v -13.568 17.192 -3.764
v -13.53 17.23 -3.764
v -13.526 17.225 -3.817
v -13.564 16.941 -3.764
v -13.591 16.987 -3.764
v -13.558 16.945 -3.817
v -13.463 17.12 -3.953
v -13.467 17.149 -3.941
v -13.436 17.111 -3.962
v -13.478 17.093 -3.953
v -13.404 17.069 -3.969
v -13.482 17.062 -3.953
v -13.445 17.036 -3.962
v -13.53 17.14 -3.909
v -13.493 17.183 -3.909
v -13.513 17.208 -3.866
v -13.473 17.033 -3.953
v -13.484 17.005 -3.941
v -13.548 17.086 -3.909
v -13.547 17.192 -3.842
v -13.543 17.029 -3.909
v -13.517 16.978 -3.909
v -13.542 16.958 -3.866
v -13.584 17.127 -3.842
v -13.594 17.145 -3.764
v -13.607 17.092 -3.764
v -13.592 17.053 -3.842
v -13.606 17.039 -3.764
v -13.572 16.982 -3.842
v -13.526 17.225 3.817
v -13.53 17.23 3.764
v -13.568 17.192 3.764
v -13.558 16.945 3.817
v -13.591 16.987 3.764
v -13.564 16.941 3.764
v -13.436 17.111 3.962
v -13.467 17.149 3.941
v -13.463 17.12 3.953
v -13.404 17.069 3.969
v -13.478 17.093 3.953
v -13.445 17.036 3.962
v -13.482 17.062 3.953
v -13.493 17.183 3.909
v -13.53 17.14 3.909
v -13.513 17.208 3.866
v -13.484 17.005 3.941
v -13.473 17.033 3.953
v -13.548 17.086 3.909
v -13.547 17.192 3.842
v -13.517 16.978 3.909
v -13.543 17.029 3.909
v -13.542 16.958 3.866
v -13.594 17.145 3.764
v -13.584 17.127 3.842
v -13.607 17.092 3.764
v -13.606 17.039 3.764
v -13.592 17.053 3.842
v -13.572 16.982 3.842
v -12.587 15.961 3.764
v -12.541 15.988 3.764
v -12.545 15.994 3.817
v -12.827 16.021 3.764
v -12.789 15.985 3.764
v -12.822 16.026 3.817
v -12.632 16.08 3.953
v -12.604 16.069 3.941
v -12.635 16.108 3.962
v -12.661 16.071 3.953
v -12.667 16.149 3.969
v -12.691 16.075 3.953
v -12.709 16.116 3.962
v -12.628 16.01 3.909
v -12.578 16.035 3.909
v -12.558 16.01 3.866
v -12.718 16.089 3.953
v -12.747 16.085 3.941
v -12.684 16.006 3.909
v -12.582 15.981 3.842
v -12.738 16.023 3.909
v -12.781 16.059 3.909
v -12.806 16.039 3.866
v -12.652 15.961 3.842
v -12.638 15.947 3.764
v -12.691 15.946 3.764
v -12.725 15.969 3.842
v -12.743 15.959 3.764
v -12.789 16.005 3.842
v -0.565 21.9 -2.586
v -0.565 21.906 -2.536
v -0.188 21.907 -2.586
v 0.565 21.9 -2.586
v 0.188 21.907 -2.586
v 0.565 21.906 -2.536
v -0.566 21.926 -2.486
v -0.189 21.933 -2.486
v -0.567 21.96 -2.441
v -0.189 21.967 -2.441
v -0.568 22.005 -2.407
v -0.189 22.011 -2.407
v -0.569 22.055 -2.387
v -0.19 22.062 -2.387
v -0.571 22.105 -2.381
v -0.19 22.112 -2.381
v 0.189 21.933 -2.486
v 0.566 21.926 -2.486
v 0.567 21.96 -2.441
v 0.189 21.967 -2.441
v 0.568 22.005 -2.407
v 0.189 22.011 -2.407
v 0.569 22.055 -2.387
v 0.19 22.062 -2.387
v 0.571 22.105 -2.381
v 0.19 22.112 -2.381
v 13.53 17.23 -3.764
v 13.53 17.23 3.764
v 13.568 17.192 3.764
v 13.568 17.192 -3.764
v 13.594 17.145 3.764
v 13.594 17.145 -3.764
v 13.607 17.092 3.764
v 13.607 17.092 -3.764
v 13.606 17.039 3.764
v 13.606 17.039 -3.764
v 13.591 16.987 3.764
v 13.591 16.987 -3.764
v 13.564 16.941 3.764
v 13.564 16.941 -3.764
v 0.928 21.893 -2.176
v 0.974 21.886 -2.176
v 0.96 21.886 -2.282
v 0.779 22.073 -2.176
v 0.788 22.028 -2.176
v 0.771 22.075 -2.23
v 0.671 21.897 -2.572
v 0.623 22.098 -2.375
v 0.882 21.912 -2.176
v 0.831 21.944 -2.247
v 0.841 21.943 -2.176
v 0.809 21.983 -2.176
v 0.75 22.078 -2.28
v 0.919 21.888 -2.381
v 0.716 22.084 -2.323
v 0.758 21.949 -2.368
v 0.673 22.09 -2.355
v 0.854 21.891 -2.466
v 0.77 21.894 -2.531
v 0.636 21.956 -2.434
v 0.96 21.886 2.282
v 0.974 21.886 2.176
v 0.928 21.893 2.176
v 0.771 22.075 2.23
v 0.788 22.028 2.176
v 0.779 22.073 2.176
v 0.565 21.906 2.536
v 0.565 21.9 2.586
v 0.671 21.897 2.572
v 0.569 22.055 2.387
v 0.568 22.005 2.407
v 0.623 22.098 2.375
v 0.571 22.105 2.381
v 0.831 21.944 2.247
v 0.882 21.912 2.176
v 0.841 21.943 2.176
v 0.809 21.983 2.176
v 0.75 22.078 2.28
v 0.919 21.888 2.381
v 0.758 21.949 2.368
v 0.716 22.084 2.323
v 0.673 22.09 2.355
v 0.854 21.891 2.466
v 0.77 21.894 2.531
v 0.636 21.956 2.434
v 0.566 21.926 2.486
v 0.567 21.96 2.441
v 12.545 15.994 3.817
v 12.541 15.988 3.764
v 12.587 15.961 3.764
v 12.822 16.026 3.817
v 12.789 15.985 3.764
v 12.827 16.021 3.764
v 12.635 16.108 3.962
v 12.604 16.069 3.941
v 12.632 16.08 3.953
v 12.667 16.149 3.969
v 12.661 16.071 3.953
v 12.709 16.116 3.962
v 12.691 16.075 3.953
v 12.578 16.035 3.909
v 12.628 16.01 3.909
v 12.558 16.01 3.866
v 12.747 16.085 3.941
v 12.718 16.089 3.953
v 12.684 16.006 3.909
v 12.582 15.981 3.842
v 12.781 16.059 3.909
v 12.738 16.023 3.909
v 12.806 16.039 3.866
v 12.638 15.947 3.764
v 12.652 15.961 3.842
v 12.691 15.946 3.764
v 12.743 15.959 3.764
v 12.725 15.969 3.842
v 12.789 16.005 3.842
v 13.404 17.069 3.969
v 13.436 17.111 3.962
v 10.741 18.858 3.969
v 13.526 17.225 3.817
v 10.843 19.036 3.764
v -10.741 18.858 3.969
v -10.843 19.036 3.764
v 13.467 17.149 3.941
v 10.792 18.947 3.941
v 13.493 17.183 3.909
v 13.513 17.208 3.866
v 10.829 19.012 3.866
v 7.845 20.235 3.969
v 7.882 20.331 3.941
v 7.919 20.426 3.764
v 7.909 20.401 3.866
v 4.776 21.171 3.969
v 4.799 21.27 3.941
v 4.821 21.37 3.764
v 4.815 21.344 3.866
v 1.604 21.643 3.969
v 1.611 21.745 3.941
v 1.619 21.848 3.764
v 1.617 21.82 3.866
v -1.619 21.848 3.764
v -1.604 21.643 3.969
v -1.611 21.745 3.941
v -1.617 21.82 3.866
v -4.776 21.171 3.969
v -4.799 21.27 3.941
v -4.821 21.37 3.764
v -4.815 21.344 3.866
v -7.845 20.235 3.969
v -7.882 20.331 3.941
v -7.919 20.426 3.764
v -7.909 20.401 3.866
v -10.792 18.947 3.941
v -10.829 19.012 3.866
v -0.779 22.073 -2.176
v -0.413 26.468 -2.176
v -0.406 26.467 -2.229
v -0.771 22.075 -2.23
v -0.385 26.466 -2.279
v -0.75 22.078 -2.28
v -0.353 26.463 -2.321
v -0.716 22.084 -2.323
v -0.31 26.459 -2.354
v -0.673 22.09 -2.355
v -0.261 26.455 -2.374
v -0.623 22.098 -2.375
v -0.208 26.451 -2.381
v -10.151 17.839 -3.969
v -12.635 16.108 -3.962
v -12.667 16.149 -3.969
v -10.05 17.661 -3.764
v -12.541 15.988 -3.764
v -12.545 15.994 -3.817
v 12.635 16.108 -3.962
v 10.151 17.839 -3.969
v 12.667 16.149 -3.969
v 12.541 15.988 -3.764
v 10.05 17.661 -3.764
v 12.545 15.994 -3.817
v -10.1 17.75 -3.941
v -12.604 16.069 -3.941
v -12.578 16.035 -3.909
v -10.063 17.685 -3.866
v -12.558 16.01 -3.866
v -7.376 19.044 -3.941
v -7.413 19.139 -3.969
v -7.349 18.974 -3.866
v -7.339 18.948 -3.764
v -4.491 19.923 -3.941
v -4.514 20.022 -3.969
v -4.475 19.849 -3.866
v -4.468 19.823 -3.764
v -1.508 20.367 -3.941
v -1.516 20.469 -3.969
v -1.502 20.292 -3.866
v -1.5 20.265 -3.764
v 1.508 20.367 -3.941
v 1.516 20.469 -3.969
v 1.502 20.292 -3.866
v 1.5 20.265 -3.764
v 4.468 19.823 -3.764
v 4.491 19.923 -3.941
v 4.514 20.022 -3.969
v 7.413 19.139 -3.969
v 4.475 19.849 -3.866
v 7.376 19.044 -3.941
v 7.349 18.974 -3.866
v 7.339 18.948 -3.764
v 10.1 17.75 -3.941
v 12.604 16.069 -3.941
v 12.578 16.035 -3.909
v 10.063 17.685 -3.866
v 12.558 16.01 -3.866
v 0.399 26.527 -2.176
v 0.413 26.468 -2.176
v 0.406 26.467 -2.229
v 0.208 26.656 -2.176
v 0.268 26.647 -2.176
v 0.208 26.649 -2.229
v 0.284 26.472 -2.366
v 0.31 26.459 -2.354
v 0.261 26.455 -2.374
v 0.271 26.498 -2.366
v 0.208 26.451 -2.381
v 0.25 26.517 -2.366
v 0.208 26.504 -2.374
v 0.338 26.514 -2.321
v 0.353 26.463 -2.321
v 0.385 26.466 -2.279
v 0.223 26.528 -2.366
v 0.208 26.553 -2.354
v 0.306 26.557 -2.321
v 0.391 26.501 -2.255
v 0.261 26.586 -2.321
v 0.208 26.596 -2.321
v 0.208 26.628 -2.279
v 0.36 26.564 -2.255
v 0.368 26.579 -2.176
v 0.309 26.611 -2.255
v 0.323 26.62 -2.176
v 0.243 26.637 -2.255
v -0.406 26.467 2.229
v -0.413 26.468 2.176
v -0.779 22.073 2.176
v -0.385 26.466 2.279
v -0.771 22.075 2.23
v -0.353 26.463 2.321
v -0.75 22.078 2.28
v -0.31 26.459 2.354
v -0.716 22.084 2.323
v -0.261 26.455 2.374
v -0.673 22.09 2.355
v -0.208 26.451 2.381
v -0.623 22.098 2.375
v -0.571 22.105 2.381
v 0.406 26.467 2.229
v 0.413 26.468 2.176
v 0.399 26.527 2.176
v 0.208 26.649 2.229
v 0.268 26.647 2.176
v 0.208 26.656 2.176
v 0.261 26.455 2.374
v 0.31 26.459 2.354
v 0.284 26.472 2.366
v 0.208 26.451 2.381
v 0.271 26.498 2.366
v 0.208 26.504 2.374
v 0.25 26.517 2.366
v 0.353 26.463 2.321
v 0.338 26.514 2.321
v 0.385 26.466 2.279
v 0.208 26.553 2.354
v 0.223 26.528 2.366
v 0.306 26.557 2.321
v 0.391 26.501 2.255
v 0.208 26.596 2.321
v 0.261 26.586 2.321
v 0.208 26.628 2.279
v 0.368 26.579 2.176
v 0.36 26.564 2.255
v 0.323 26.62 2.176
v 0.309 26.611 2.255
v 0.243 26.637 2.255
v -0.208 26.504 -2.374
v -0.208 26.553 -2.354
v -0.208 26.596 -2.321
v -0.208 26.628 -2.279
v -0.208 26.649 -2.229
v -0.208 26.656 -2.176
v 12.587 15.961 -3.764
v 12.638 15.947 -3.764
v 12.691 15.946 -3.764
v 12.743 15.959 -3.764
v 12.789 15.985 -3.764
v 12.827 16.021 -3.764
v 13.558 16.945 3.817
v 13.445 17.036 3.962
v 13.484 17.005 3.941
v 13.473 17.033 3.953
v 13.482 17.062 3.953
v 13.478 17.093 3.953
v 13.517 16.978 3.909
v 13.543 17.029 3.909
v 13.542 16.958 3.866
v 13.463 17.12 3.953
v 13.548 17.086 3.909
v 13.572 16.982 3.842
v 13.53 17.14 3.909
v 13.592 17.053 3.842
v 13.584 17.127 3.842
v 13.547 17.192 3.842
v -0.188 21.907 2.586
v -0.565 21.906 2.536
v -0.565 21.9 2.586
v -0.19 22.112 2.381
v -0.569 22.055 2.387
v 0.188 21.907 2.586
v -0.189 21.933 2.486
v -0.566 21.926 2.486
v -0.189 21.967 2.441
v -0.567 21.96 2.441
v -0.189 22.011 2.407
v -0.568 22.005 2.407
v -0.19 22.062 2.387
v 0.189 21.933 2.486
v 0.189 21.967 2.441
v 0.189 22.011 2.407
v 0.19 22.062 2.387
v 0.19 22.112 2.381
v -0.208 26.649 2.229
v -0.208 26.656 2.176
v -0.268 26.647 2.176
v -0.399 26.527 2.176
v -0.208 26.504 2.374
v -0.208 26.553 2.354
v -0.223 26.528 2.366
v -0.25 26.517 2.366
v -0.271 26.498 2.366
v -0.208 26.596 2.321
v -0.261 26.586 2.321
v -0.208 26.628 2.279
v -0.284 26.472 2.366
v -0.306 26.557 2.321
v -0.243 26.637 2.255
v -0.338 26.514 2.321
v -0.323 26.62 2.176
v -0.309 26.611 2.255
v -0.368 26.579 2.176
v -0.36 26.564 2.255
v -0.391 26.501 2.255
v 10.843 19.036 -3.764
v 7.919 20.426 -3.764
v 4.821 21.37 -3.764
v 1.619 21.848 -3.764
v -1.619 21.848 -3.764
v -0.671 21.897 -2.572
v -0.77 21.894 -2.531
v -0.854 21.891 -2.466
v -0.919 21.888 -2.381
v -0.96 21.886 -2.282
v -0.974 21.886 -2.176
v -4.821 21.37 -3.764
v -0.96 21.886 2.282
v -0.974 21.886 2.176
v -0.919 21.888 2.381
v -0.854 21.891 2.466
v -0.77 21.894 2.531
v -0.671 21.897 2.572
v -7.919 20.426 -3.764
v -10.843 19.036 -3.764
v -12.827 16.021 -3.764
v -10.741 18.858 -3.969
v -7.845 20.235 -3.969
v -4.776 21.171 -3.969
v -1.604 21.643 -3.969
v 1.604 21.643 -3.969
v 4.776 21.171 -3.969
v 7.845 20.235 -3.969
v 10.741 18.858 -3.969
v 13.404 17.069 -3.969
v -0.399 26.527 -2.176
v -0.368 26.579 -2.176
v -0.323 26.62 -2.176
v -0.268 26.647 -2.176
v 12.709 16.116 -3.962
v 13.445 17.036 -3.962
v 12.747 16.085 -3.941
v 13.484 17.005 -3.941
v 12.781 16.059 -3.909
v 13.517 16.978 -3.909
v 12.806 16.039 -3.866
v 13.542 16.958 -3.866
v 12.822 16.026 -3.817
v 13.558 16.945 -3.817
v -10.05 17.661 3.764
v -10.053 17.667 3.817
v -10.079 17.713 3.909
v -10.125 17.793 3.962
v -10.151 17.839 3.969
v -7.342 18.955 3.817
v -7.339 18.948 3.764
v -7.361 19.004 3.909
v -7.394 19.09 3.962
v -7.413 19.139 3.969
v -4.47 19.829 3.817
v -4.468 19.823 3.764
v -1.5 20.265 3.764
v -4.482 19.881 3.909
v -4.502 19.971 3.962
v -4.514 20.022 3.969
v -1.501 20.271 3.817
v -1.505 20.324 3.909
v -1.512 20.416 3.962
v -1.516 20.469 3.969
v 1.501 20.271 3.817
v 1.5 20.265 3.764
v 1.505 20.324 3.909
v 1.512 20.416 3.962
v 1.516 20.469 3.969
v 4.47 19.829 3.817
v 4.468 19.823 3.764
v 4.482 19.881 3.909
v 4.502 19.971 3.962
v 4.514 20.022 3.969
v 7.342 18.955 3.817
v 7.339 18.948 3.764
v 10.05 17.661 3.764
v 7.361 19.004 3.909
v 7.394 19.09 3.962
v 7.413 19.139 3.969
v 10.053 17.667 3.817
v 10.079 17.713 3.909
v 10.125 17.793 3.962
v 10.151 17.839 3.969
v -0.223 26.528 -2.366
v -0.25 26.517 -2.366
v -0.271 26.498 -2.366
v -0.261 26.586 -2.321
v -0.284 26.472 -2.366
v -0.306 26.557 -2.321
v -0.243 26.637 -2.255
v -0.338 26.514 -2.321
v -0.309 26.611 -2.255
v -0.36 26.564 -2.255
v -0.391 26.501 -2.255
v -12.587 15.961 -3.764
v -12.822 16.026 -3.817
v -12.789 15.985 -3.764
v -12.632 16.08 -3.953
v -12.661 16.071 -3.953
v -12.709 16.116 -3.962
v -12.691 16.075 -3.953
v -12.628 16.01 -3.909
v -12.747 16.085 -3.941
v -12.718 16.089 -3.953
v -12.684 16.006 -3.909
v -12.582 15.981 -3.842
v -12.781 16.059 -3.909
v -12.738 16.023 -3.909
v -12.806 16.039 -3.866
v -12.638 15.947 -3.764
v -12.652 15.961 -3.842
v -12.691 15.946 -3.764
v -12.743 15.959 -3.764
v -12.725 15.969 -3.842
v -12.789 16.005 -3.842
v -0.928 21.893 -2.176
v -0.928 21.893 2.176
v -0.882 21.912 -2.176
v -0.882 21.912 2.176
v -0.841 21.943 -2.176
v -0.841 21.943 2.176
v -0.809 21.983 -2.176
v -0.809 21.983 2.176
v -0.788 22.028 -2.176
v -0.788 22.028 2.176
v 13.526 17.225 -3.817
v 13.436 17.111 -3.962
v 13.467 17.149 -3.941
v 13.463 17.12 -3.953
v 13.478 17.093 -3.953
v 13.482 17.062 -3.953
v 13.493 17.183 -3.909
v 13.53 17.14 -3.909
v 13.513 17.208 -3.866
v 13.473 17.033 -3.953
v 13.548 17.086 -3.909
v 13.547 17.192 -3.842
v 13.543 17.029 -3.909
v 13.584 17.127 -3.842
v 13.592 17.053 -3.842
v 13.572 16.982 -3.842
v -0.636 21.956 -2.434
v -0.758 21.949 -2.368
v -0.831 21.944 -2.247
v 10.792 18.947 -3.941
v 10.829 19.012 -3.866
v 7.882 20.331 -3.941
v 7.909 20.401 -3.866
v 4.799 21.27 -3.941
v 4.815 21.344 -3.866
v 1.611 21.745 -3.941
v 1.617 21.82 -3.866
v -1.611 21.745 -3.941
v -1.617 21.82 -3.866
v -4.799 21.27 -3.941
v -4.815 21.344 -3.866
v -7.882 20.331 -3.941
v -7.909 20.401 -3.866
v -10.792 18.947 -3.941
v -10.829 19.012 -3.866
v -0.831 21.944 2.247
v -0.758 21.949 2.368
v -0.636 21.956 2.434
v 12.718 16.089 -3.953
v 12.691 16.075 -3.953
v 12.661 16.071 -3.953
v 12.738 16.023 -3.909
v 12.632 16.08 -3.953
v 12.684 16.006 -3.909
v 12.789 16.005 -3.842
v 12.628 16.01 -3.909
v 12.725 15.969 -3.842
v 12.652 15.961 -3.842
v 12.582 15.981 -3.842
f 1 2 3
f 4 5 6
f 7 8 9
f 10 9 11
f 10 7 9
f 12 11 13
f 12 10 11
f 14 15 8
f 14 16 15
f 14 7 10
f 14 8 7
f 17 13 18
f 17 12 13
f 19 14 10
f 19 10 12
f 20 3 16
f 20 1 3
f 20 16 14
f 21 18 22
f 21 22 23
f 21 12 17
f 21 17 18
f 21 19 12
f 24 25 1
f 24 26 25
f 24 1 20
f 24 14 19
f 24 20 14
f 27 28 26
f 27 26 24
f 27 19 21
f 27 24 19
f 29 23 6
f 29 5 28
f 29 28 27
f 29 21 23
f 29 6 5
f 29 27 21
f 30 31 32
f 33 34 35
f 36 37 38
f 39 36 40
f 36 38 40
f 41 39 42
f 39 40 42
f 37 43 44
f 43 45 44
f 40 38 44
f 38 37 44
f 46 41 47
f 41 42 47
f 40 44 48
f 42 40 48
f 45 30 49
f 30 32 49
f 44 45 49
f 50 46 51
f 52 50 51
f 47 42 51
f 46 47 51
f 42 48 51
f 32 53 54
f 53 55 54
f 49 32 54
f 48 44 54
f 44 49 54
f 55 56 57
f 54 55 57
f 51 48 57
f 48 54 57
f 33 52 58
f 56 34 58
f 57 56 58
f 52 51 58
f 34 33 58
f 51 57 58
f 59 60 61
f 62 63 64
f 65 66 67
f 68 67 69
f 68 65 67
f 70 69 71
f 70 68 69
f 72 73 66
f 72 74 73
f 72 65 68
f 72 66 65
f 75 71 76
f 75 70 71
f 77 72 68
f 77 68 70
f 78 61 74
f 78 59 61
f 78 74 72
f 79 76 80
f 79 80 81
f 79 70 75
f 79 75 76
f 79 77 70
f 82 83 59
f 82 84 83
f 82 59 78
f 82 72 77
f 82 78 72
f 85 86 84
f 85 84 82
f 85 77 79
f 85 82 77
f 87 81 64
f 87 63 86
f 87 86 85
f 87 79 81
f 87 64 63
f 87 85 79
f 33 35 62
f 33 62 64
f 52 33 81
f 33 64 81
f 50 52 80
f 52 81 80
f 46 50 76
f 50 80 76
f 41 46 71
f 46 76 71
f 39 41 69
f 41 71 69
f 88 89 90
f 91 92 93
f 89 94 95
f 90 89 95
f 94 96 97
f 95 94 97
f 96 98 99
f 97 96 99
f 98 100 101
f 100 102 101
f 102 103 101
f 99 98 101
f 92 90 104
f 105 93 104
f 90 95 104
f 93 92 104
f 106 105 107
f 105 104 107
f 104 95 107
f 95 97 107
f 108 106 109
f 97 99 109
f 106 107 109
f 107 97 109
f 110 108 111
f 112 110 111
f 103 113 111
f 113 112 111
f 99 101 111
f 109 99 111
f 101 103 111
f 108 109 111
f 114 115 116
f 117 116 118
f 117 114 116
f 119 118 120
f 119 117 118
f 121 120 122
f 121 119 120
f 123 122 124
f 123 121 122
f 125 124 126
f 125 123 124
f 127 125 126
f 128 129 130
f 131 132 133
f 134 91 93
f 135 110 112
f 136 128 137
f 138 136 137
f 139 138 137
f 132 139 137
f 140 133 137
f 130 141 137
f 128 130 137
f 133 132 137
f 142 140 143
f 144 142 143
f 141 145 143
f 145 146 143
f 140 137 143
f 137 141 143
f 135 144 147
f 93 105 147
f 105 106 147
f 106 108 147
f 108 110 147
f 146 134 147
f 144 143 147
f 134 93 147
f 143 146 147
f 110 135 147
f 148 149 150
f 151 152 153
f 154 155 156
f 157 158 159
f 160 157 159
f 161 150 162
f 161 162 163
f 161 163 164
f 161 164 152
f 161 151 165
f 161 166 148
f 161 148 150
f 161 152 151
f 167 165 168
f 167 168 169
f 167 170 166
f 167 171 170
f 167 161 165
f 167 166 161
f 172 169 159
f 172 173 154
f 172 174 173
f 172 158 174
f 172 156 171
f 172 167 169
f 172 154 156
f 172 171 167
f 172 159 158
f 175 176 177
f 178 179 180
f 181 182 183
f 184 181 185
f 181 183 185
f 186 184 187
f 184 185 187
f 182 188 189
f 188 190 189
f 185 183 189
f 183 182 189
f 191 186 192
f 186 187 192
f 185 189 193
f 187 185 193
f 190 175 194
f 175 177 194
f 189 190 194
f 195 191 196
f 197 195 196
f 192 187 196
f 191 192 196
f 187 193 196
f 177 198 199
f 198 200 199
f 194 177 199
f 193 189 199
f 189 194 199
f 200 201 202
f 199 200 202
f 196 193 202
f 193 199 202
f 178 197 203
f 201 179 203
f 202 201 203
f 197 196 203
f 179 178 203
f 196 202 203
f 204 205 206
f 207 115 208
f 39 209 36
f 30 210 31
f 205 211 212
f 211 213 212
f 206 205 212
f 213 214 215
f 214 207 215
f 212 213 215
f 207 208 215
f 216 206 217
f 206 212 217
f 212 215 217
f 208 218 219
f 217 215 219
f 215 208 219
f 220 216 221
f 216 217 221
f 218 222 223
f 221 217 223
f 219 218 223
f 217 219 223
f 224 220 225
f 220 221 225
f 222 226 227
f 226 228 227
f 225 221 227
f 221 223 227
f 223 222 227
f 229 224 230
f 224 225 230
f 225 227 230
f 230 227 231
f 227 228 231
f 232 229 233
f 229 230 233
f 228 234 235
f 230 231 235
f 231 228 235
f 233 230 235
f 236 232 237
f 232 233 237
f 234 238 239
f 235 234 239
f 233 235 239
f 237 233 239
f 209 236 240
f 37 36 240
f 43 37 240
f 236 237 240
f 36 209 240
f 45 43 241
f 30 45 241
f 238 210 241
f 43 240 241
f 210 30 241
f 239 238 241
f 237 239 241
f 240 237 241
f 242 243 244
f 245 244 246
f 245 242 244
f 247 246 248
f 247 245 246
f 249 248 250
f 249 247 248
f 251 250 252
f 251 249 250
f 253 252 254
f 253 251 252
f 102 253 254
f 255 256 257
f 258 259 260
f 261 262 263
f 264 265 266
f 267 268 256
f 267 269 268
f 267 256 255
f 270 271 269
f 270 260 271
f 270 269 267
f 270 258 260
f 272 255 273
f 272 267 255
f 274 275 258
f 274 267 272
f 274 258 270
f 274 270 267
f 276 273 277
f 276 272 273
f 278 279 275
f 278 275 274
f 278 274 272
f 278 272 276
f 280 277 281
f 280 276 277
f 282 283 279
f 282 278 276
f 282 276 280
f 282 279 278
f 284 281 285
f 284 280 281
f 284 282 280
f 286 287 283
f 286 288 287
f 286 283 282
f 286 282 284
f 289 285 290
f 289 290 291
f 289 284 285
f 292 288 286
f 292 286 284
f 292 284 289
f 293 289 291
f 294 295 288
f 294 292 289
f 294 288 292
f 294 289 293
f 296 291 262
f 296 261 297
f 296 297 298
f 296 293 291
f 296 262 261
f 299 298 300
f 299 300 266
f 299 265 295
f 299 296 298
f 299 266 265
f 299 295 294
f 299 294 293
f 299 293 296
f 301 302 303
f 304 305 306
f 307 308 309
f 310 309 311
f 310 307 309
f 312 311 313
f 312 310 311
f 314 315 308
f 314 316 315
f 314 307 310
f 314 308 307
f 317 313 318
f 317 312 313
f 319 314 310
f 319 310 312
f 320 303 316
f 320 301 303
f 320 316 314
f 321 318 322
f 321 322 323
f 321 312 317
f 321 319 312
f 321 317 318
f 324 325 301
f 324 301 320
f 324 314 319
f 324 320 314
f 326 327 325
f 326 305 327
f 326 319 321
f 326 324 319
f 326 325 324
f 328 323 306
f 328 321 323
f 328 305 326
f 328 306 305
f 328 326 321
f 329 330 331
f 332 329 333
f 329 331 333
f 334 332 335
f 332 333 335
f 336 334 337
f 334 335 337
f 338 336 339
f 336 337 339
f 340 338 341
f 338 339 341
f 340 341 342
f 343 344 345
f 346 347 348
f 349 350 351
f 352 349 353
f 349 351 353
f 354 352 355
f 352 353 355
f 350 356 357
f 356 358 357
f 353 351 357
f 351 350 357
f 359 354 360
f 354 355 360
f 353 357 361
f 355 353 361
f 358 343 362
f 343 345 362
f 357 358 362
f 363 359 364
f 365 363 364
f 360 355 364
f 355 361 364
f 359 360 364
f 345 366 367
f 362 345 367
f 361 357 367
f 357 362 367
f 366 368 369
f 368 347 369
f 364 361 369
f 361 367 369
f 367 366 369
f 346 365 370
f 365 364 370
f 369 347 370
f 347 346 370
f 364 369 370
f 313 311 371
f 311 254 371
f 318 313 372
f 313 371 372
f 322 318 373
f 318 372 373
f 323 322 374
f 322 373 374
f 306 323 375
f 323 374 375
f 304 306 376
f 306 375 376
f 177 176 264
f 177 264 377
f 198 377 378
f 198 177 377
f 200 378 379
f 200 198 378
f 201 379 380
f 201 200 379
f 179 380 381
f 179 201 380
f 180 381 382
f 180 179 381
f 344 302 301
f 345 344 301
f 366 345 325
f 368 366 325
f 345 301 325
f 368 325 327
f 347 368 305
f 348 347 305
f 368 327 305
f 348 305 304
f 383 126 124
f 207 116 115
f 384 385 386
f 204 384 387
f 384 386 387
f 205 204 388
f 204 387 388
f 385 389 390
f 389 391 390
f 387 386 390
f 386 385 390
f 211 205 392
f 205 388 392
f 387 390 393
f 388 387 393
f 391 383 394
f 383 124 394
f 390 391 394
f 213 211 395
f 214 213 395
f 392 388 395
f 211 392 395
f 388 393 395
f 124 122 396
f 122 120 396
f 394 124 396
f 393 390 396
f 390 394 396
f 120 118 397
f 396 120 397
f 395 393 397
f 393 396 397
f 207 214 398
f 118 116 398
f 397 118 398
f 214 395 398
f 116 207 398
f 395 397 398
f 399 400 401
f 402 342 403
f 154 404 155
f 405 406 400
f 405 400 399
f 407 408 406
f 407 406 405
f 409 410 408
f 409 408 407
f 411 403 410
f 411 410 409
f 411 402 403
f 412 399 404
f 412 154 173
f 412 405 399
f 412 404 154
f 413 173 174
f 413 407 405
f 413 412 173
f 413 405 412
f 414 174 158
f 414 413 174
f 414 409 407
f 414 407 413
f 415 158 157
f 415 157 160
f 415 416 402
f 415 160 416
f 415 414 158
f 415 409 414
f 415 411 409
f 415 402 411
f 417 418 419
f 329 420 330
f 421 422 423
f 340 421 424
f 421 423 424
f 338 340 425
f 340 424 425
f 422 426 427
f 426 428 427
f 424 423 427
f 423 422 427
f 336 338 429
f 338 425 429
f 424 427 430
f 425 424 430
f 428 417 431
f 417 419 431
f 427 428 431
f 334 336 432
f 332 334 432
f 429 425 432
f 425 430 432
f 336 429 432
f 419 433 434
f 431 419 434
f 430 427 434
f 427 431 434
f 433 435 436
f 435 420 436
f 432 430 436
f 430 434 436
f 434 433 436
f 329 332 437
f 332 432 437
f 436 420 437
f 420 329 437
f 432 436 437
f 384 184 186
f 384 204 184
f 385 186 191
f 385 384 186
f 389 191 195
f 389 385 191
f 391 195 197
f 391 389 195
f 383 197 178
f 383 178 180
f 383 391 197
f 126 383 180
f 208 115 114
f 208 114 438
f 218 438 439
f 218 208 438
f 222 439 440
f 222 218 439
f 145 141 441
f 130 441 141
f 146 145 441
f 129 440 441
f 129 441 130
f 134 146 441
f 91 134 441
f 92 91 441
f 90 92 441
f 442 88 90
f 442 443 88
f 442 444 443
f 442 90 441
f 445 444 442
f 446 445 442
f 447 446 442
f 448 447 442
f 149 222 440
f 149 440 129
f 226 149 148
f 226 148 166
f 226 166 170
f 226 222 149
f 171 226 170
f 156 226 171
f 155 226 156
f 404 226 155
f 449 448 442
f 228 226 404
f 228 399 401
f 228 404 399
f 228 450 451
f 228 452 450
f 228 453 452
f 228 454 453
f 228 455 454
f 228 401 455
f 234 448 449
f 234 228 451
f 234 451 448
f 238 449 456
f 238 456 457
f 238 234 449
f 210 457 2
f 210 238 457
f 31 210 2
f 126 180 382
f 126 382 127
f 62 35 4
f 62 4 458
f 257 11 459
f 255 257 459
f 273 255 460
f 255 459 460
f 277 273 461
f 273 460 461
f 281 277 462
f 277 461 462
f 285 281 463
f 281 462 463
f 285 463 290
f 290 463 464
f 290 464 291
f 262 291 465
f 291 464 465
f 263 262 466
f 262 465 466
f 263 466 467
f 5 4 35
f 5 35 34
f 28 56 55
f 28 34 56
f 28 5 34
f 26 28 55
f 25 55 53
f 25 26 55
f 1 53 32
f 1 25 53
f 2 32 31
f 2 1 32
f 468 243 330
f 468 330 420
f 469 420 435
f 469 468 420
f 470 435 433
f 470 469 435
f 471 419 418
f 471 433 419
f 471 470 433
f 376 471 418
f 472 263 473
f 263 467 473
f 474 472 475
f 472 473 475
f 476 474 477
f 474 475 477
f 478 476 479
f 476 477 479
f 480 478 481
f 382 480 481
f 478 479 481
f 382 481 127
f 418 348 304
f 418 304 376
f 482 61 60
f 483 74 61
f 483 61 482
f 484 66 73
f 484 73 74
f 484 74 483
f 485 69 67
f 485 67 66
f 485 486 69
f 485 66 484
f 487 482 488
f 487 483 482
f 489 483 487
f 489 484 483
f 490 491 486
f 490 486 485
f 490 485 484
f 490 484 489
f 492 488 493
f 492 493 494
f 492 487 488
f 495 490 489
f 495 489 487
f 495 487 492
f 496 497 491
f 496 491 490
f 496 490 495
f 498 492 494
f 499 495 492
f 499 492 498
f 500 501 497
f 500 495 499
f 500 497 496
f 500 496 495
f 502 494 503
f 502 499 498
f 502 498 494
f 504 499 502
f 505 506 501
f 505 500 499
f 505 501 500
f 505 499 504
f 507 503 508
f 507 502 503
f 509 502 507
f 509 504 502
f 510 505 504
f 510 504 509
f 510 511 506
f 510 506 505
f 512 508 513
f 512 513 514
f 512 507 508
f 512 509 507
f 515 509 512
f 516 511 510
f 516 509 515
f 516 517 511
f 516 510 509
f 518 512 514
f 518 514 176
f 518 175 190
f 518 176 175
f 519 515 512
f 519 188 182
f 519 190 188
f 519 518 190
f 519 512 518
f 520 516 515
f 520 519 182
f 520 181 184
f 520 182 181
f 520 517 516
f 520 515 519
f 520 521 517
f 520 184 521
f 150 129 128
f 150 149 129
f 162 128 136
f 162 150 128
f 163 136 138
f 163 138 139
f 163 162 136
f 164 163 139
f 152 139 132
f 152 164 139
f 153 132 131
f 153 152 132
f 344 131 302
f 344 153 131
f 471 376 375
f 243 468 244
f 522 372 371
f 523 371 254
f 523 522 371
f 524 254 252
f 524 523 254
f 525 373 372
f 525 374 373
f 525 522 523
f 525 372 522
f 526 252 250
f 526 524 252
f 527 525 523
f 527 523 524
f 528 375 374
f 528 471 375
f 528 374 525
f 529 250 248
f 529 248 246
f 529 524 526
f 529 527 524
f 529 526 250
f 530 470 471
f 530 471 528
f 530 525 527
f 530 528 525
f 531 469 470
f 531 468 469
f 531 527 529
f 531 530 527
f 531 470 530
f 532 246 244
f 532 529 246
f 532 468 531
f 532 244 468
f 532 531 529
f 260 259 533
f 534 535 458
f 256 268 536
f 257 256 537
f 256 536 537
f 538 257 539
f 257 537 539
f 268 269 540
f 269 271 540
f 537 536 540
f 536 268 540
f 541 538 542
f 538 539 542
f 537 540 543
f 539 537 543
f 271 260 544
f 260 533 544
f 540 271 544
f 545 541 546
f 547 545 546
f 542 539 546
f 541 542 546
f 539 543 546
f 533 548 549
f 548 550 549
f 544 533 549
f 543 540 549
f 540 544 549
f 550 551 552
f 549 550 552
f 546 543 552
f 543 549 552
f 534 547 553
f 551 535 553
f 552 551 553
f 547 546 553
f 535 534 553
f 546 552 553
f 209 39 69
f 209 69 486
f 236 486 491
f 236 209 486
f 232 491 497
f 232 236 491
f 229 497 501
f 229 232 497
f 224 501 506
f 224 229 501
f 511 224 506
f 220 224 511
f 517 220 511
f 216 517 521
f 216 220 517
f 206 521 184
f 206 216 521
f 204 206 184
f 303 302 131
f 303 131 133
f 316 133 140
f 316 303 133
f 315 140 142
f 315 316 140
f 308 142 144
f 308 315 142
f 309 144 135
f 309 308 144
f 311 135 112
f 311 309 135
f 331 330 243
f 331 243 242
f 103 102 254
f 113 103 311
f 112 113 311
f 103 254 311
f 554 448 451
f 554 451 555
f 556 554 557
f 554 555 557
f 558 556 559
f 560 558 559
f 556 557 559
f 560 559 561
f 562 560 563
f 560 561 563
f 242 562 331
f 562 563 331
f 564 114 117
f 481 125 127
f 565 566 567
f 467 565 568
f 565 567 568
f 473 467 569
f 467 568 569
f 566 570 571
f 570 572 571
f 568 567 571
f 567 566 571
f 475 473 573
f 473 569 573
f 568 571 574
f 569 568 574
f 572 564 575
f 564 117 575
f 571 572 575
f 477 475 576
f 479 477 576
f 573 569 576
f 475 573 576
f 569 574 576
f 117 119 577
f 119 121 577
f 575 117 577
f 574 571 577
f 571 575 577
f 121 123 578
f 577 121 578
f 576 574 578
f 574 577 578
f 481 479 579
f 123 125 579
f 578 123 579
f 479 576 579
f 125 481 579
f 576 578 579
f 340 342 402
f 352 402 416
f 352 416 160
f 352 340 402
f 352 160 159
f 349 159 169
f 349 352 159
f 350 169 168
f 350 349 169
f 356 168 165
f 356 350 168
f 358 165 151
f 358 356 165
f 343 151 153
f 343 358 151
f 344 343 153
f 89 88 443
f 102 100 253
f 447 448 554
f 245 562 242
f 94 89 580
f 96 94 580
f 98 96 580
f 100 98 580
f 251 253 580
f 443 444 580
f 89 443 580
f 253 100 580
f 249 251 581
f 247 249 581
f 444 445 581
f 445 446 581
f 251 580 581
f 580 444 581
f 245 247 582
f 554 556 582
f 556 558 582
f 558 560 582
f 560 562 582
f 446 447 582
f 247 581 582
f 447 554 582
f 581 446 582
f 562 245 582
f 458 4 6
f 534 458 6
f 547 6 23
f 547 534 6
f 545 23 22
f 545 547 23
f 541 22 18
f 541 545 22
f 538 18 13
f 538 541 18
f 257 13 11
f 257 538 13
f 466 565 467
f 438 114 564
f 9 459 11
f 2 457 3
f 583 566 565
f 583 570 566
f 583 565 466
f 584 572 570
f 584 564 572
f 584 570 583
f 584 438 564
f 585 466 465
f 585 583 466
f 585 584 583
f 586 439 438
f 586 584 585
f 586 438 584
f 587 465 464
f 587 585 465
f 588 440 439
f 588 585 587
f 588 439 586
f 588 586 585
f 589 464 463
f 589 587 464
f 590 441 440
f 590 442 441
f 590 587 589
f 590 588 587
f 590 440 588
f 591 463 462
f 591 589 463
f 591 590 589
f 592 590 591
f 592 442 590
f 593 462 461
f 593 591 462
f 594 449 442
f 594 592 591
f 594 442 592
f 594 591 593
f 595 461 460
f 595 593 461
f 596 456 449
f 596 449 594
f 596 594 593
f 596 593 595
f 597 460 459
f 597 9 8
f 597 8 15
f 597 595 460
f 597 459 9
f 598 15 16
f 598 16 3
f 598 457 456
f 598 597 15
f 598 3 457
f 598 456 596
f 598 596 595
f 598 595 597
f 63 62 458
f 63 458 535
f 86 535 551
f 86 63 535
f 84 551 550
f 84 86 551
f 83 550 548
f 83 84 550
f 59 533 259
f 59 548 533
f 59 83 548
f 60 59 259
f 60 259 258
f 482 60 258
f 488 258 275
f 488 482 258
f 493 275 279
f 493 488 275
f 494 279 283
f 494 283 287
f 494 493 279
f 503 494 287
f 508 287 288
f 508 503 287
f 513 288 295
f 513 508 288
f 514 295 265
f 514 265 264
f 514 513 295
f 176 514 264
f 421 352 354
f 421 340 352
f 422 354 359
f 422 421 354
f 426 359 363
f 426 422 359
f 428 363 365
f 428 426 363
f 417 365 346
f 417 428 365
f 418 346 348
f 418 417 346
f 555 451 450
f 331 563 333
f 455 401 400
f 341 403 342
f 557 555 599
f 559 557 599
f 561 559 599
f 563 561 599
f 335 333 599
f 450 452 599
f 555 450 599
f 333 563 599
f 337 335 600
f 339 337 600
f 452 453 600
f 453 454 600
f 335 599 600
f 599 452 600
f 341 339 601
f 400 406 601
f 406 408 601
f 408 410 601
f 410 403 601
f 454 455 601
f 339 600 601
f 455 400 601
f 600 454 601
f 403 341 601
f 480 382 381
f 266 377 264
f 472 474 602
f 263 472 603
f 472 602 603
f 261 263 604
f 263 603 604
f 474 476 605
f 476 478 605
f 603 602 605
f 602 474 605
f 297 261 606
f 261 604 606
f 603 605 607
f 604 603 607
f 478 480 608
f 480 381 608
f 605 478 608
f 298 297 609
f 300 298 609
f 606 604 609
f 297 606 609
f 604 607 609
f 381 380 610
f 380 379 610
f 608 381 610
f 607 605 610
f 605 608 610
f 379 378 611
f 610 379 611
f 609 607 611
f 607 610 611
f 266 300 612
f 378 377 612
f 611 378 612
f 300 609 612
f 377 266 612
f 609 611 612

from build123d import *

# Parameters (mm, degrees)
BOSS_EXTRUDE1_DEPTH = 3.96875
BOSS_EXTRUDE2_DEPTH = 2.38125
FILLET1_R           = 0.20483871


with BuildPart() as part:
    # Sketch1 → Boss-Extrude1 (new body, symmetric)
    with BuildSketch(Plane.XY):
        with BuildLine():
            Line((-13.6921875, 17.101536706), (-12.7, 15.862294916))
            ThreePointArc((-12.7, 15.862294916), (0, 20.32), (12.7, 15.862294916))
            Line((12.7, 15.862294916), (13.6921875, 17.101536706))
            ThreePointArc((13.6921875, 17.101536706), (0, 21.9075), (-13.6921875, 17.101536706))
        make_face()
    extrude(amount=BOSS_EXTRUDE1_DEPTH, both=True)

    # Sketch1<3> → Boss-Extrude2 (add, symmetric)
    with BuildSketch(Plane.XY):
        with BuildLine():
            Line((-0.396875, 26.655615749), (-0.79375, 21.893115749))
            ThreePointArc((-0.79375, 21.893115749), (0, 21.9075), (0.79375, 21.893115749))
            Line((0.79375, 21.893115749), (0.396875, 26.655615749))
            Line((0.396875, 26.655615749), (0, 26.655615749))
            Line((0, 26.655615749), (-0.396875, 26.655615749))
        make_face()
    extrude(amount=BOSS_EXTRUDE2_DEPTH, both=True)

    # Fillet1
    fillet1_edges = [part.edges().sort_by_distance(p)[0] for p in [
        (13.19609375, 16.481915811, 3.96875),
        (-0.5953125, 24.274365749, 2.38125),
        (-0.396875, 26.655615749, 0),
        (0, 21.9075, 3.96875),
        (0, 21.9075, -2.38125),
        (-0.79375, 21.893115749, 0),
        (0.5953125, 24.274365749, -2.38125),
        (0.79375, 21.893115749, 0),
        (0, 26.655615749, -2.38125),
        (0.396875, 26.655615749, 0),
        (0, 21.9075, 2.38125),
        (0.5953125, 24.274365749, 2.38125),
        (0, 26.655615749, 2.38125),
        (-0.5953125, 24.274365749, -2.38125),
        (-13.19609375, 16.481915811, 3.96875),
        (0, 21.9075, -3.96875),
        (13.19609375, 16.481915811, -3.96875),
        (0, 20.32, -3.96875),
        (-13.19609375, 16.481915811, -3.96875),
        (-13.6921875, 17.101536706, 0),
        (13.6921875, 17.101536706, 0),
        (12.7, 15.862294916, 0),
        (-12.7, 15.862294916, 0),
        (0, 20.32, 3.96875),
    ]]
    fillet(fillet1_edges, radius=FILLET1_R)


solid = part.part
